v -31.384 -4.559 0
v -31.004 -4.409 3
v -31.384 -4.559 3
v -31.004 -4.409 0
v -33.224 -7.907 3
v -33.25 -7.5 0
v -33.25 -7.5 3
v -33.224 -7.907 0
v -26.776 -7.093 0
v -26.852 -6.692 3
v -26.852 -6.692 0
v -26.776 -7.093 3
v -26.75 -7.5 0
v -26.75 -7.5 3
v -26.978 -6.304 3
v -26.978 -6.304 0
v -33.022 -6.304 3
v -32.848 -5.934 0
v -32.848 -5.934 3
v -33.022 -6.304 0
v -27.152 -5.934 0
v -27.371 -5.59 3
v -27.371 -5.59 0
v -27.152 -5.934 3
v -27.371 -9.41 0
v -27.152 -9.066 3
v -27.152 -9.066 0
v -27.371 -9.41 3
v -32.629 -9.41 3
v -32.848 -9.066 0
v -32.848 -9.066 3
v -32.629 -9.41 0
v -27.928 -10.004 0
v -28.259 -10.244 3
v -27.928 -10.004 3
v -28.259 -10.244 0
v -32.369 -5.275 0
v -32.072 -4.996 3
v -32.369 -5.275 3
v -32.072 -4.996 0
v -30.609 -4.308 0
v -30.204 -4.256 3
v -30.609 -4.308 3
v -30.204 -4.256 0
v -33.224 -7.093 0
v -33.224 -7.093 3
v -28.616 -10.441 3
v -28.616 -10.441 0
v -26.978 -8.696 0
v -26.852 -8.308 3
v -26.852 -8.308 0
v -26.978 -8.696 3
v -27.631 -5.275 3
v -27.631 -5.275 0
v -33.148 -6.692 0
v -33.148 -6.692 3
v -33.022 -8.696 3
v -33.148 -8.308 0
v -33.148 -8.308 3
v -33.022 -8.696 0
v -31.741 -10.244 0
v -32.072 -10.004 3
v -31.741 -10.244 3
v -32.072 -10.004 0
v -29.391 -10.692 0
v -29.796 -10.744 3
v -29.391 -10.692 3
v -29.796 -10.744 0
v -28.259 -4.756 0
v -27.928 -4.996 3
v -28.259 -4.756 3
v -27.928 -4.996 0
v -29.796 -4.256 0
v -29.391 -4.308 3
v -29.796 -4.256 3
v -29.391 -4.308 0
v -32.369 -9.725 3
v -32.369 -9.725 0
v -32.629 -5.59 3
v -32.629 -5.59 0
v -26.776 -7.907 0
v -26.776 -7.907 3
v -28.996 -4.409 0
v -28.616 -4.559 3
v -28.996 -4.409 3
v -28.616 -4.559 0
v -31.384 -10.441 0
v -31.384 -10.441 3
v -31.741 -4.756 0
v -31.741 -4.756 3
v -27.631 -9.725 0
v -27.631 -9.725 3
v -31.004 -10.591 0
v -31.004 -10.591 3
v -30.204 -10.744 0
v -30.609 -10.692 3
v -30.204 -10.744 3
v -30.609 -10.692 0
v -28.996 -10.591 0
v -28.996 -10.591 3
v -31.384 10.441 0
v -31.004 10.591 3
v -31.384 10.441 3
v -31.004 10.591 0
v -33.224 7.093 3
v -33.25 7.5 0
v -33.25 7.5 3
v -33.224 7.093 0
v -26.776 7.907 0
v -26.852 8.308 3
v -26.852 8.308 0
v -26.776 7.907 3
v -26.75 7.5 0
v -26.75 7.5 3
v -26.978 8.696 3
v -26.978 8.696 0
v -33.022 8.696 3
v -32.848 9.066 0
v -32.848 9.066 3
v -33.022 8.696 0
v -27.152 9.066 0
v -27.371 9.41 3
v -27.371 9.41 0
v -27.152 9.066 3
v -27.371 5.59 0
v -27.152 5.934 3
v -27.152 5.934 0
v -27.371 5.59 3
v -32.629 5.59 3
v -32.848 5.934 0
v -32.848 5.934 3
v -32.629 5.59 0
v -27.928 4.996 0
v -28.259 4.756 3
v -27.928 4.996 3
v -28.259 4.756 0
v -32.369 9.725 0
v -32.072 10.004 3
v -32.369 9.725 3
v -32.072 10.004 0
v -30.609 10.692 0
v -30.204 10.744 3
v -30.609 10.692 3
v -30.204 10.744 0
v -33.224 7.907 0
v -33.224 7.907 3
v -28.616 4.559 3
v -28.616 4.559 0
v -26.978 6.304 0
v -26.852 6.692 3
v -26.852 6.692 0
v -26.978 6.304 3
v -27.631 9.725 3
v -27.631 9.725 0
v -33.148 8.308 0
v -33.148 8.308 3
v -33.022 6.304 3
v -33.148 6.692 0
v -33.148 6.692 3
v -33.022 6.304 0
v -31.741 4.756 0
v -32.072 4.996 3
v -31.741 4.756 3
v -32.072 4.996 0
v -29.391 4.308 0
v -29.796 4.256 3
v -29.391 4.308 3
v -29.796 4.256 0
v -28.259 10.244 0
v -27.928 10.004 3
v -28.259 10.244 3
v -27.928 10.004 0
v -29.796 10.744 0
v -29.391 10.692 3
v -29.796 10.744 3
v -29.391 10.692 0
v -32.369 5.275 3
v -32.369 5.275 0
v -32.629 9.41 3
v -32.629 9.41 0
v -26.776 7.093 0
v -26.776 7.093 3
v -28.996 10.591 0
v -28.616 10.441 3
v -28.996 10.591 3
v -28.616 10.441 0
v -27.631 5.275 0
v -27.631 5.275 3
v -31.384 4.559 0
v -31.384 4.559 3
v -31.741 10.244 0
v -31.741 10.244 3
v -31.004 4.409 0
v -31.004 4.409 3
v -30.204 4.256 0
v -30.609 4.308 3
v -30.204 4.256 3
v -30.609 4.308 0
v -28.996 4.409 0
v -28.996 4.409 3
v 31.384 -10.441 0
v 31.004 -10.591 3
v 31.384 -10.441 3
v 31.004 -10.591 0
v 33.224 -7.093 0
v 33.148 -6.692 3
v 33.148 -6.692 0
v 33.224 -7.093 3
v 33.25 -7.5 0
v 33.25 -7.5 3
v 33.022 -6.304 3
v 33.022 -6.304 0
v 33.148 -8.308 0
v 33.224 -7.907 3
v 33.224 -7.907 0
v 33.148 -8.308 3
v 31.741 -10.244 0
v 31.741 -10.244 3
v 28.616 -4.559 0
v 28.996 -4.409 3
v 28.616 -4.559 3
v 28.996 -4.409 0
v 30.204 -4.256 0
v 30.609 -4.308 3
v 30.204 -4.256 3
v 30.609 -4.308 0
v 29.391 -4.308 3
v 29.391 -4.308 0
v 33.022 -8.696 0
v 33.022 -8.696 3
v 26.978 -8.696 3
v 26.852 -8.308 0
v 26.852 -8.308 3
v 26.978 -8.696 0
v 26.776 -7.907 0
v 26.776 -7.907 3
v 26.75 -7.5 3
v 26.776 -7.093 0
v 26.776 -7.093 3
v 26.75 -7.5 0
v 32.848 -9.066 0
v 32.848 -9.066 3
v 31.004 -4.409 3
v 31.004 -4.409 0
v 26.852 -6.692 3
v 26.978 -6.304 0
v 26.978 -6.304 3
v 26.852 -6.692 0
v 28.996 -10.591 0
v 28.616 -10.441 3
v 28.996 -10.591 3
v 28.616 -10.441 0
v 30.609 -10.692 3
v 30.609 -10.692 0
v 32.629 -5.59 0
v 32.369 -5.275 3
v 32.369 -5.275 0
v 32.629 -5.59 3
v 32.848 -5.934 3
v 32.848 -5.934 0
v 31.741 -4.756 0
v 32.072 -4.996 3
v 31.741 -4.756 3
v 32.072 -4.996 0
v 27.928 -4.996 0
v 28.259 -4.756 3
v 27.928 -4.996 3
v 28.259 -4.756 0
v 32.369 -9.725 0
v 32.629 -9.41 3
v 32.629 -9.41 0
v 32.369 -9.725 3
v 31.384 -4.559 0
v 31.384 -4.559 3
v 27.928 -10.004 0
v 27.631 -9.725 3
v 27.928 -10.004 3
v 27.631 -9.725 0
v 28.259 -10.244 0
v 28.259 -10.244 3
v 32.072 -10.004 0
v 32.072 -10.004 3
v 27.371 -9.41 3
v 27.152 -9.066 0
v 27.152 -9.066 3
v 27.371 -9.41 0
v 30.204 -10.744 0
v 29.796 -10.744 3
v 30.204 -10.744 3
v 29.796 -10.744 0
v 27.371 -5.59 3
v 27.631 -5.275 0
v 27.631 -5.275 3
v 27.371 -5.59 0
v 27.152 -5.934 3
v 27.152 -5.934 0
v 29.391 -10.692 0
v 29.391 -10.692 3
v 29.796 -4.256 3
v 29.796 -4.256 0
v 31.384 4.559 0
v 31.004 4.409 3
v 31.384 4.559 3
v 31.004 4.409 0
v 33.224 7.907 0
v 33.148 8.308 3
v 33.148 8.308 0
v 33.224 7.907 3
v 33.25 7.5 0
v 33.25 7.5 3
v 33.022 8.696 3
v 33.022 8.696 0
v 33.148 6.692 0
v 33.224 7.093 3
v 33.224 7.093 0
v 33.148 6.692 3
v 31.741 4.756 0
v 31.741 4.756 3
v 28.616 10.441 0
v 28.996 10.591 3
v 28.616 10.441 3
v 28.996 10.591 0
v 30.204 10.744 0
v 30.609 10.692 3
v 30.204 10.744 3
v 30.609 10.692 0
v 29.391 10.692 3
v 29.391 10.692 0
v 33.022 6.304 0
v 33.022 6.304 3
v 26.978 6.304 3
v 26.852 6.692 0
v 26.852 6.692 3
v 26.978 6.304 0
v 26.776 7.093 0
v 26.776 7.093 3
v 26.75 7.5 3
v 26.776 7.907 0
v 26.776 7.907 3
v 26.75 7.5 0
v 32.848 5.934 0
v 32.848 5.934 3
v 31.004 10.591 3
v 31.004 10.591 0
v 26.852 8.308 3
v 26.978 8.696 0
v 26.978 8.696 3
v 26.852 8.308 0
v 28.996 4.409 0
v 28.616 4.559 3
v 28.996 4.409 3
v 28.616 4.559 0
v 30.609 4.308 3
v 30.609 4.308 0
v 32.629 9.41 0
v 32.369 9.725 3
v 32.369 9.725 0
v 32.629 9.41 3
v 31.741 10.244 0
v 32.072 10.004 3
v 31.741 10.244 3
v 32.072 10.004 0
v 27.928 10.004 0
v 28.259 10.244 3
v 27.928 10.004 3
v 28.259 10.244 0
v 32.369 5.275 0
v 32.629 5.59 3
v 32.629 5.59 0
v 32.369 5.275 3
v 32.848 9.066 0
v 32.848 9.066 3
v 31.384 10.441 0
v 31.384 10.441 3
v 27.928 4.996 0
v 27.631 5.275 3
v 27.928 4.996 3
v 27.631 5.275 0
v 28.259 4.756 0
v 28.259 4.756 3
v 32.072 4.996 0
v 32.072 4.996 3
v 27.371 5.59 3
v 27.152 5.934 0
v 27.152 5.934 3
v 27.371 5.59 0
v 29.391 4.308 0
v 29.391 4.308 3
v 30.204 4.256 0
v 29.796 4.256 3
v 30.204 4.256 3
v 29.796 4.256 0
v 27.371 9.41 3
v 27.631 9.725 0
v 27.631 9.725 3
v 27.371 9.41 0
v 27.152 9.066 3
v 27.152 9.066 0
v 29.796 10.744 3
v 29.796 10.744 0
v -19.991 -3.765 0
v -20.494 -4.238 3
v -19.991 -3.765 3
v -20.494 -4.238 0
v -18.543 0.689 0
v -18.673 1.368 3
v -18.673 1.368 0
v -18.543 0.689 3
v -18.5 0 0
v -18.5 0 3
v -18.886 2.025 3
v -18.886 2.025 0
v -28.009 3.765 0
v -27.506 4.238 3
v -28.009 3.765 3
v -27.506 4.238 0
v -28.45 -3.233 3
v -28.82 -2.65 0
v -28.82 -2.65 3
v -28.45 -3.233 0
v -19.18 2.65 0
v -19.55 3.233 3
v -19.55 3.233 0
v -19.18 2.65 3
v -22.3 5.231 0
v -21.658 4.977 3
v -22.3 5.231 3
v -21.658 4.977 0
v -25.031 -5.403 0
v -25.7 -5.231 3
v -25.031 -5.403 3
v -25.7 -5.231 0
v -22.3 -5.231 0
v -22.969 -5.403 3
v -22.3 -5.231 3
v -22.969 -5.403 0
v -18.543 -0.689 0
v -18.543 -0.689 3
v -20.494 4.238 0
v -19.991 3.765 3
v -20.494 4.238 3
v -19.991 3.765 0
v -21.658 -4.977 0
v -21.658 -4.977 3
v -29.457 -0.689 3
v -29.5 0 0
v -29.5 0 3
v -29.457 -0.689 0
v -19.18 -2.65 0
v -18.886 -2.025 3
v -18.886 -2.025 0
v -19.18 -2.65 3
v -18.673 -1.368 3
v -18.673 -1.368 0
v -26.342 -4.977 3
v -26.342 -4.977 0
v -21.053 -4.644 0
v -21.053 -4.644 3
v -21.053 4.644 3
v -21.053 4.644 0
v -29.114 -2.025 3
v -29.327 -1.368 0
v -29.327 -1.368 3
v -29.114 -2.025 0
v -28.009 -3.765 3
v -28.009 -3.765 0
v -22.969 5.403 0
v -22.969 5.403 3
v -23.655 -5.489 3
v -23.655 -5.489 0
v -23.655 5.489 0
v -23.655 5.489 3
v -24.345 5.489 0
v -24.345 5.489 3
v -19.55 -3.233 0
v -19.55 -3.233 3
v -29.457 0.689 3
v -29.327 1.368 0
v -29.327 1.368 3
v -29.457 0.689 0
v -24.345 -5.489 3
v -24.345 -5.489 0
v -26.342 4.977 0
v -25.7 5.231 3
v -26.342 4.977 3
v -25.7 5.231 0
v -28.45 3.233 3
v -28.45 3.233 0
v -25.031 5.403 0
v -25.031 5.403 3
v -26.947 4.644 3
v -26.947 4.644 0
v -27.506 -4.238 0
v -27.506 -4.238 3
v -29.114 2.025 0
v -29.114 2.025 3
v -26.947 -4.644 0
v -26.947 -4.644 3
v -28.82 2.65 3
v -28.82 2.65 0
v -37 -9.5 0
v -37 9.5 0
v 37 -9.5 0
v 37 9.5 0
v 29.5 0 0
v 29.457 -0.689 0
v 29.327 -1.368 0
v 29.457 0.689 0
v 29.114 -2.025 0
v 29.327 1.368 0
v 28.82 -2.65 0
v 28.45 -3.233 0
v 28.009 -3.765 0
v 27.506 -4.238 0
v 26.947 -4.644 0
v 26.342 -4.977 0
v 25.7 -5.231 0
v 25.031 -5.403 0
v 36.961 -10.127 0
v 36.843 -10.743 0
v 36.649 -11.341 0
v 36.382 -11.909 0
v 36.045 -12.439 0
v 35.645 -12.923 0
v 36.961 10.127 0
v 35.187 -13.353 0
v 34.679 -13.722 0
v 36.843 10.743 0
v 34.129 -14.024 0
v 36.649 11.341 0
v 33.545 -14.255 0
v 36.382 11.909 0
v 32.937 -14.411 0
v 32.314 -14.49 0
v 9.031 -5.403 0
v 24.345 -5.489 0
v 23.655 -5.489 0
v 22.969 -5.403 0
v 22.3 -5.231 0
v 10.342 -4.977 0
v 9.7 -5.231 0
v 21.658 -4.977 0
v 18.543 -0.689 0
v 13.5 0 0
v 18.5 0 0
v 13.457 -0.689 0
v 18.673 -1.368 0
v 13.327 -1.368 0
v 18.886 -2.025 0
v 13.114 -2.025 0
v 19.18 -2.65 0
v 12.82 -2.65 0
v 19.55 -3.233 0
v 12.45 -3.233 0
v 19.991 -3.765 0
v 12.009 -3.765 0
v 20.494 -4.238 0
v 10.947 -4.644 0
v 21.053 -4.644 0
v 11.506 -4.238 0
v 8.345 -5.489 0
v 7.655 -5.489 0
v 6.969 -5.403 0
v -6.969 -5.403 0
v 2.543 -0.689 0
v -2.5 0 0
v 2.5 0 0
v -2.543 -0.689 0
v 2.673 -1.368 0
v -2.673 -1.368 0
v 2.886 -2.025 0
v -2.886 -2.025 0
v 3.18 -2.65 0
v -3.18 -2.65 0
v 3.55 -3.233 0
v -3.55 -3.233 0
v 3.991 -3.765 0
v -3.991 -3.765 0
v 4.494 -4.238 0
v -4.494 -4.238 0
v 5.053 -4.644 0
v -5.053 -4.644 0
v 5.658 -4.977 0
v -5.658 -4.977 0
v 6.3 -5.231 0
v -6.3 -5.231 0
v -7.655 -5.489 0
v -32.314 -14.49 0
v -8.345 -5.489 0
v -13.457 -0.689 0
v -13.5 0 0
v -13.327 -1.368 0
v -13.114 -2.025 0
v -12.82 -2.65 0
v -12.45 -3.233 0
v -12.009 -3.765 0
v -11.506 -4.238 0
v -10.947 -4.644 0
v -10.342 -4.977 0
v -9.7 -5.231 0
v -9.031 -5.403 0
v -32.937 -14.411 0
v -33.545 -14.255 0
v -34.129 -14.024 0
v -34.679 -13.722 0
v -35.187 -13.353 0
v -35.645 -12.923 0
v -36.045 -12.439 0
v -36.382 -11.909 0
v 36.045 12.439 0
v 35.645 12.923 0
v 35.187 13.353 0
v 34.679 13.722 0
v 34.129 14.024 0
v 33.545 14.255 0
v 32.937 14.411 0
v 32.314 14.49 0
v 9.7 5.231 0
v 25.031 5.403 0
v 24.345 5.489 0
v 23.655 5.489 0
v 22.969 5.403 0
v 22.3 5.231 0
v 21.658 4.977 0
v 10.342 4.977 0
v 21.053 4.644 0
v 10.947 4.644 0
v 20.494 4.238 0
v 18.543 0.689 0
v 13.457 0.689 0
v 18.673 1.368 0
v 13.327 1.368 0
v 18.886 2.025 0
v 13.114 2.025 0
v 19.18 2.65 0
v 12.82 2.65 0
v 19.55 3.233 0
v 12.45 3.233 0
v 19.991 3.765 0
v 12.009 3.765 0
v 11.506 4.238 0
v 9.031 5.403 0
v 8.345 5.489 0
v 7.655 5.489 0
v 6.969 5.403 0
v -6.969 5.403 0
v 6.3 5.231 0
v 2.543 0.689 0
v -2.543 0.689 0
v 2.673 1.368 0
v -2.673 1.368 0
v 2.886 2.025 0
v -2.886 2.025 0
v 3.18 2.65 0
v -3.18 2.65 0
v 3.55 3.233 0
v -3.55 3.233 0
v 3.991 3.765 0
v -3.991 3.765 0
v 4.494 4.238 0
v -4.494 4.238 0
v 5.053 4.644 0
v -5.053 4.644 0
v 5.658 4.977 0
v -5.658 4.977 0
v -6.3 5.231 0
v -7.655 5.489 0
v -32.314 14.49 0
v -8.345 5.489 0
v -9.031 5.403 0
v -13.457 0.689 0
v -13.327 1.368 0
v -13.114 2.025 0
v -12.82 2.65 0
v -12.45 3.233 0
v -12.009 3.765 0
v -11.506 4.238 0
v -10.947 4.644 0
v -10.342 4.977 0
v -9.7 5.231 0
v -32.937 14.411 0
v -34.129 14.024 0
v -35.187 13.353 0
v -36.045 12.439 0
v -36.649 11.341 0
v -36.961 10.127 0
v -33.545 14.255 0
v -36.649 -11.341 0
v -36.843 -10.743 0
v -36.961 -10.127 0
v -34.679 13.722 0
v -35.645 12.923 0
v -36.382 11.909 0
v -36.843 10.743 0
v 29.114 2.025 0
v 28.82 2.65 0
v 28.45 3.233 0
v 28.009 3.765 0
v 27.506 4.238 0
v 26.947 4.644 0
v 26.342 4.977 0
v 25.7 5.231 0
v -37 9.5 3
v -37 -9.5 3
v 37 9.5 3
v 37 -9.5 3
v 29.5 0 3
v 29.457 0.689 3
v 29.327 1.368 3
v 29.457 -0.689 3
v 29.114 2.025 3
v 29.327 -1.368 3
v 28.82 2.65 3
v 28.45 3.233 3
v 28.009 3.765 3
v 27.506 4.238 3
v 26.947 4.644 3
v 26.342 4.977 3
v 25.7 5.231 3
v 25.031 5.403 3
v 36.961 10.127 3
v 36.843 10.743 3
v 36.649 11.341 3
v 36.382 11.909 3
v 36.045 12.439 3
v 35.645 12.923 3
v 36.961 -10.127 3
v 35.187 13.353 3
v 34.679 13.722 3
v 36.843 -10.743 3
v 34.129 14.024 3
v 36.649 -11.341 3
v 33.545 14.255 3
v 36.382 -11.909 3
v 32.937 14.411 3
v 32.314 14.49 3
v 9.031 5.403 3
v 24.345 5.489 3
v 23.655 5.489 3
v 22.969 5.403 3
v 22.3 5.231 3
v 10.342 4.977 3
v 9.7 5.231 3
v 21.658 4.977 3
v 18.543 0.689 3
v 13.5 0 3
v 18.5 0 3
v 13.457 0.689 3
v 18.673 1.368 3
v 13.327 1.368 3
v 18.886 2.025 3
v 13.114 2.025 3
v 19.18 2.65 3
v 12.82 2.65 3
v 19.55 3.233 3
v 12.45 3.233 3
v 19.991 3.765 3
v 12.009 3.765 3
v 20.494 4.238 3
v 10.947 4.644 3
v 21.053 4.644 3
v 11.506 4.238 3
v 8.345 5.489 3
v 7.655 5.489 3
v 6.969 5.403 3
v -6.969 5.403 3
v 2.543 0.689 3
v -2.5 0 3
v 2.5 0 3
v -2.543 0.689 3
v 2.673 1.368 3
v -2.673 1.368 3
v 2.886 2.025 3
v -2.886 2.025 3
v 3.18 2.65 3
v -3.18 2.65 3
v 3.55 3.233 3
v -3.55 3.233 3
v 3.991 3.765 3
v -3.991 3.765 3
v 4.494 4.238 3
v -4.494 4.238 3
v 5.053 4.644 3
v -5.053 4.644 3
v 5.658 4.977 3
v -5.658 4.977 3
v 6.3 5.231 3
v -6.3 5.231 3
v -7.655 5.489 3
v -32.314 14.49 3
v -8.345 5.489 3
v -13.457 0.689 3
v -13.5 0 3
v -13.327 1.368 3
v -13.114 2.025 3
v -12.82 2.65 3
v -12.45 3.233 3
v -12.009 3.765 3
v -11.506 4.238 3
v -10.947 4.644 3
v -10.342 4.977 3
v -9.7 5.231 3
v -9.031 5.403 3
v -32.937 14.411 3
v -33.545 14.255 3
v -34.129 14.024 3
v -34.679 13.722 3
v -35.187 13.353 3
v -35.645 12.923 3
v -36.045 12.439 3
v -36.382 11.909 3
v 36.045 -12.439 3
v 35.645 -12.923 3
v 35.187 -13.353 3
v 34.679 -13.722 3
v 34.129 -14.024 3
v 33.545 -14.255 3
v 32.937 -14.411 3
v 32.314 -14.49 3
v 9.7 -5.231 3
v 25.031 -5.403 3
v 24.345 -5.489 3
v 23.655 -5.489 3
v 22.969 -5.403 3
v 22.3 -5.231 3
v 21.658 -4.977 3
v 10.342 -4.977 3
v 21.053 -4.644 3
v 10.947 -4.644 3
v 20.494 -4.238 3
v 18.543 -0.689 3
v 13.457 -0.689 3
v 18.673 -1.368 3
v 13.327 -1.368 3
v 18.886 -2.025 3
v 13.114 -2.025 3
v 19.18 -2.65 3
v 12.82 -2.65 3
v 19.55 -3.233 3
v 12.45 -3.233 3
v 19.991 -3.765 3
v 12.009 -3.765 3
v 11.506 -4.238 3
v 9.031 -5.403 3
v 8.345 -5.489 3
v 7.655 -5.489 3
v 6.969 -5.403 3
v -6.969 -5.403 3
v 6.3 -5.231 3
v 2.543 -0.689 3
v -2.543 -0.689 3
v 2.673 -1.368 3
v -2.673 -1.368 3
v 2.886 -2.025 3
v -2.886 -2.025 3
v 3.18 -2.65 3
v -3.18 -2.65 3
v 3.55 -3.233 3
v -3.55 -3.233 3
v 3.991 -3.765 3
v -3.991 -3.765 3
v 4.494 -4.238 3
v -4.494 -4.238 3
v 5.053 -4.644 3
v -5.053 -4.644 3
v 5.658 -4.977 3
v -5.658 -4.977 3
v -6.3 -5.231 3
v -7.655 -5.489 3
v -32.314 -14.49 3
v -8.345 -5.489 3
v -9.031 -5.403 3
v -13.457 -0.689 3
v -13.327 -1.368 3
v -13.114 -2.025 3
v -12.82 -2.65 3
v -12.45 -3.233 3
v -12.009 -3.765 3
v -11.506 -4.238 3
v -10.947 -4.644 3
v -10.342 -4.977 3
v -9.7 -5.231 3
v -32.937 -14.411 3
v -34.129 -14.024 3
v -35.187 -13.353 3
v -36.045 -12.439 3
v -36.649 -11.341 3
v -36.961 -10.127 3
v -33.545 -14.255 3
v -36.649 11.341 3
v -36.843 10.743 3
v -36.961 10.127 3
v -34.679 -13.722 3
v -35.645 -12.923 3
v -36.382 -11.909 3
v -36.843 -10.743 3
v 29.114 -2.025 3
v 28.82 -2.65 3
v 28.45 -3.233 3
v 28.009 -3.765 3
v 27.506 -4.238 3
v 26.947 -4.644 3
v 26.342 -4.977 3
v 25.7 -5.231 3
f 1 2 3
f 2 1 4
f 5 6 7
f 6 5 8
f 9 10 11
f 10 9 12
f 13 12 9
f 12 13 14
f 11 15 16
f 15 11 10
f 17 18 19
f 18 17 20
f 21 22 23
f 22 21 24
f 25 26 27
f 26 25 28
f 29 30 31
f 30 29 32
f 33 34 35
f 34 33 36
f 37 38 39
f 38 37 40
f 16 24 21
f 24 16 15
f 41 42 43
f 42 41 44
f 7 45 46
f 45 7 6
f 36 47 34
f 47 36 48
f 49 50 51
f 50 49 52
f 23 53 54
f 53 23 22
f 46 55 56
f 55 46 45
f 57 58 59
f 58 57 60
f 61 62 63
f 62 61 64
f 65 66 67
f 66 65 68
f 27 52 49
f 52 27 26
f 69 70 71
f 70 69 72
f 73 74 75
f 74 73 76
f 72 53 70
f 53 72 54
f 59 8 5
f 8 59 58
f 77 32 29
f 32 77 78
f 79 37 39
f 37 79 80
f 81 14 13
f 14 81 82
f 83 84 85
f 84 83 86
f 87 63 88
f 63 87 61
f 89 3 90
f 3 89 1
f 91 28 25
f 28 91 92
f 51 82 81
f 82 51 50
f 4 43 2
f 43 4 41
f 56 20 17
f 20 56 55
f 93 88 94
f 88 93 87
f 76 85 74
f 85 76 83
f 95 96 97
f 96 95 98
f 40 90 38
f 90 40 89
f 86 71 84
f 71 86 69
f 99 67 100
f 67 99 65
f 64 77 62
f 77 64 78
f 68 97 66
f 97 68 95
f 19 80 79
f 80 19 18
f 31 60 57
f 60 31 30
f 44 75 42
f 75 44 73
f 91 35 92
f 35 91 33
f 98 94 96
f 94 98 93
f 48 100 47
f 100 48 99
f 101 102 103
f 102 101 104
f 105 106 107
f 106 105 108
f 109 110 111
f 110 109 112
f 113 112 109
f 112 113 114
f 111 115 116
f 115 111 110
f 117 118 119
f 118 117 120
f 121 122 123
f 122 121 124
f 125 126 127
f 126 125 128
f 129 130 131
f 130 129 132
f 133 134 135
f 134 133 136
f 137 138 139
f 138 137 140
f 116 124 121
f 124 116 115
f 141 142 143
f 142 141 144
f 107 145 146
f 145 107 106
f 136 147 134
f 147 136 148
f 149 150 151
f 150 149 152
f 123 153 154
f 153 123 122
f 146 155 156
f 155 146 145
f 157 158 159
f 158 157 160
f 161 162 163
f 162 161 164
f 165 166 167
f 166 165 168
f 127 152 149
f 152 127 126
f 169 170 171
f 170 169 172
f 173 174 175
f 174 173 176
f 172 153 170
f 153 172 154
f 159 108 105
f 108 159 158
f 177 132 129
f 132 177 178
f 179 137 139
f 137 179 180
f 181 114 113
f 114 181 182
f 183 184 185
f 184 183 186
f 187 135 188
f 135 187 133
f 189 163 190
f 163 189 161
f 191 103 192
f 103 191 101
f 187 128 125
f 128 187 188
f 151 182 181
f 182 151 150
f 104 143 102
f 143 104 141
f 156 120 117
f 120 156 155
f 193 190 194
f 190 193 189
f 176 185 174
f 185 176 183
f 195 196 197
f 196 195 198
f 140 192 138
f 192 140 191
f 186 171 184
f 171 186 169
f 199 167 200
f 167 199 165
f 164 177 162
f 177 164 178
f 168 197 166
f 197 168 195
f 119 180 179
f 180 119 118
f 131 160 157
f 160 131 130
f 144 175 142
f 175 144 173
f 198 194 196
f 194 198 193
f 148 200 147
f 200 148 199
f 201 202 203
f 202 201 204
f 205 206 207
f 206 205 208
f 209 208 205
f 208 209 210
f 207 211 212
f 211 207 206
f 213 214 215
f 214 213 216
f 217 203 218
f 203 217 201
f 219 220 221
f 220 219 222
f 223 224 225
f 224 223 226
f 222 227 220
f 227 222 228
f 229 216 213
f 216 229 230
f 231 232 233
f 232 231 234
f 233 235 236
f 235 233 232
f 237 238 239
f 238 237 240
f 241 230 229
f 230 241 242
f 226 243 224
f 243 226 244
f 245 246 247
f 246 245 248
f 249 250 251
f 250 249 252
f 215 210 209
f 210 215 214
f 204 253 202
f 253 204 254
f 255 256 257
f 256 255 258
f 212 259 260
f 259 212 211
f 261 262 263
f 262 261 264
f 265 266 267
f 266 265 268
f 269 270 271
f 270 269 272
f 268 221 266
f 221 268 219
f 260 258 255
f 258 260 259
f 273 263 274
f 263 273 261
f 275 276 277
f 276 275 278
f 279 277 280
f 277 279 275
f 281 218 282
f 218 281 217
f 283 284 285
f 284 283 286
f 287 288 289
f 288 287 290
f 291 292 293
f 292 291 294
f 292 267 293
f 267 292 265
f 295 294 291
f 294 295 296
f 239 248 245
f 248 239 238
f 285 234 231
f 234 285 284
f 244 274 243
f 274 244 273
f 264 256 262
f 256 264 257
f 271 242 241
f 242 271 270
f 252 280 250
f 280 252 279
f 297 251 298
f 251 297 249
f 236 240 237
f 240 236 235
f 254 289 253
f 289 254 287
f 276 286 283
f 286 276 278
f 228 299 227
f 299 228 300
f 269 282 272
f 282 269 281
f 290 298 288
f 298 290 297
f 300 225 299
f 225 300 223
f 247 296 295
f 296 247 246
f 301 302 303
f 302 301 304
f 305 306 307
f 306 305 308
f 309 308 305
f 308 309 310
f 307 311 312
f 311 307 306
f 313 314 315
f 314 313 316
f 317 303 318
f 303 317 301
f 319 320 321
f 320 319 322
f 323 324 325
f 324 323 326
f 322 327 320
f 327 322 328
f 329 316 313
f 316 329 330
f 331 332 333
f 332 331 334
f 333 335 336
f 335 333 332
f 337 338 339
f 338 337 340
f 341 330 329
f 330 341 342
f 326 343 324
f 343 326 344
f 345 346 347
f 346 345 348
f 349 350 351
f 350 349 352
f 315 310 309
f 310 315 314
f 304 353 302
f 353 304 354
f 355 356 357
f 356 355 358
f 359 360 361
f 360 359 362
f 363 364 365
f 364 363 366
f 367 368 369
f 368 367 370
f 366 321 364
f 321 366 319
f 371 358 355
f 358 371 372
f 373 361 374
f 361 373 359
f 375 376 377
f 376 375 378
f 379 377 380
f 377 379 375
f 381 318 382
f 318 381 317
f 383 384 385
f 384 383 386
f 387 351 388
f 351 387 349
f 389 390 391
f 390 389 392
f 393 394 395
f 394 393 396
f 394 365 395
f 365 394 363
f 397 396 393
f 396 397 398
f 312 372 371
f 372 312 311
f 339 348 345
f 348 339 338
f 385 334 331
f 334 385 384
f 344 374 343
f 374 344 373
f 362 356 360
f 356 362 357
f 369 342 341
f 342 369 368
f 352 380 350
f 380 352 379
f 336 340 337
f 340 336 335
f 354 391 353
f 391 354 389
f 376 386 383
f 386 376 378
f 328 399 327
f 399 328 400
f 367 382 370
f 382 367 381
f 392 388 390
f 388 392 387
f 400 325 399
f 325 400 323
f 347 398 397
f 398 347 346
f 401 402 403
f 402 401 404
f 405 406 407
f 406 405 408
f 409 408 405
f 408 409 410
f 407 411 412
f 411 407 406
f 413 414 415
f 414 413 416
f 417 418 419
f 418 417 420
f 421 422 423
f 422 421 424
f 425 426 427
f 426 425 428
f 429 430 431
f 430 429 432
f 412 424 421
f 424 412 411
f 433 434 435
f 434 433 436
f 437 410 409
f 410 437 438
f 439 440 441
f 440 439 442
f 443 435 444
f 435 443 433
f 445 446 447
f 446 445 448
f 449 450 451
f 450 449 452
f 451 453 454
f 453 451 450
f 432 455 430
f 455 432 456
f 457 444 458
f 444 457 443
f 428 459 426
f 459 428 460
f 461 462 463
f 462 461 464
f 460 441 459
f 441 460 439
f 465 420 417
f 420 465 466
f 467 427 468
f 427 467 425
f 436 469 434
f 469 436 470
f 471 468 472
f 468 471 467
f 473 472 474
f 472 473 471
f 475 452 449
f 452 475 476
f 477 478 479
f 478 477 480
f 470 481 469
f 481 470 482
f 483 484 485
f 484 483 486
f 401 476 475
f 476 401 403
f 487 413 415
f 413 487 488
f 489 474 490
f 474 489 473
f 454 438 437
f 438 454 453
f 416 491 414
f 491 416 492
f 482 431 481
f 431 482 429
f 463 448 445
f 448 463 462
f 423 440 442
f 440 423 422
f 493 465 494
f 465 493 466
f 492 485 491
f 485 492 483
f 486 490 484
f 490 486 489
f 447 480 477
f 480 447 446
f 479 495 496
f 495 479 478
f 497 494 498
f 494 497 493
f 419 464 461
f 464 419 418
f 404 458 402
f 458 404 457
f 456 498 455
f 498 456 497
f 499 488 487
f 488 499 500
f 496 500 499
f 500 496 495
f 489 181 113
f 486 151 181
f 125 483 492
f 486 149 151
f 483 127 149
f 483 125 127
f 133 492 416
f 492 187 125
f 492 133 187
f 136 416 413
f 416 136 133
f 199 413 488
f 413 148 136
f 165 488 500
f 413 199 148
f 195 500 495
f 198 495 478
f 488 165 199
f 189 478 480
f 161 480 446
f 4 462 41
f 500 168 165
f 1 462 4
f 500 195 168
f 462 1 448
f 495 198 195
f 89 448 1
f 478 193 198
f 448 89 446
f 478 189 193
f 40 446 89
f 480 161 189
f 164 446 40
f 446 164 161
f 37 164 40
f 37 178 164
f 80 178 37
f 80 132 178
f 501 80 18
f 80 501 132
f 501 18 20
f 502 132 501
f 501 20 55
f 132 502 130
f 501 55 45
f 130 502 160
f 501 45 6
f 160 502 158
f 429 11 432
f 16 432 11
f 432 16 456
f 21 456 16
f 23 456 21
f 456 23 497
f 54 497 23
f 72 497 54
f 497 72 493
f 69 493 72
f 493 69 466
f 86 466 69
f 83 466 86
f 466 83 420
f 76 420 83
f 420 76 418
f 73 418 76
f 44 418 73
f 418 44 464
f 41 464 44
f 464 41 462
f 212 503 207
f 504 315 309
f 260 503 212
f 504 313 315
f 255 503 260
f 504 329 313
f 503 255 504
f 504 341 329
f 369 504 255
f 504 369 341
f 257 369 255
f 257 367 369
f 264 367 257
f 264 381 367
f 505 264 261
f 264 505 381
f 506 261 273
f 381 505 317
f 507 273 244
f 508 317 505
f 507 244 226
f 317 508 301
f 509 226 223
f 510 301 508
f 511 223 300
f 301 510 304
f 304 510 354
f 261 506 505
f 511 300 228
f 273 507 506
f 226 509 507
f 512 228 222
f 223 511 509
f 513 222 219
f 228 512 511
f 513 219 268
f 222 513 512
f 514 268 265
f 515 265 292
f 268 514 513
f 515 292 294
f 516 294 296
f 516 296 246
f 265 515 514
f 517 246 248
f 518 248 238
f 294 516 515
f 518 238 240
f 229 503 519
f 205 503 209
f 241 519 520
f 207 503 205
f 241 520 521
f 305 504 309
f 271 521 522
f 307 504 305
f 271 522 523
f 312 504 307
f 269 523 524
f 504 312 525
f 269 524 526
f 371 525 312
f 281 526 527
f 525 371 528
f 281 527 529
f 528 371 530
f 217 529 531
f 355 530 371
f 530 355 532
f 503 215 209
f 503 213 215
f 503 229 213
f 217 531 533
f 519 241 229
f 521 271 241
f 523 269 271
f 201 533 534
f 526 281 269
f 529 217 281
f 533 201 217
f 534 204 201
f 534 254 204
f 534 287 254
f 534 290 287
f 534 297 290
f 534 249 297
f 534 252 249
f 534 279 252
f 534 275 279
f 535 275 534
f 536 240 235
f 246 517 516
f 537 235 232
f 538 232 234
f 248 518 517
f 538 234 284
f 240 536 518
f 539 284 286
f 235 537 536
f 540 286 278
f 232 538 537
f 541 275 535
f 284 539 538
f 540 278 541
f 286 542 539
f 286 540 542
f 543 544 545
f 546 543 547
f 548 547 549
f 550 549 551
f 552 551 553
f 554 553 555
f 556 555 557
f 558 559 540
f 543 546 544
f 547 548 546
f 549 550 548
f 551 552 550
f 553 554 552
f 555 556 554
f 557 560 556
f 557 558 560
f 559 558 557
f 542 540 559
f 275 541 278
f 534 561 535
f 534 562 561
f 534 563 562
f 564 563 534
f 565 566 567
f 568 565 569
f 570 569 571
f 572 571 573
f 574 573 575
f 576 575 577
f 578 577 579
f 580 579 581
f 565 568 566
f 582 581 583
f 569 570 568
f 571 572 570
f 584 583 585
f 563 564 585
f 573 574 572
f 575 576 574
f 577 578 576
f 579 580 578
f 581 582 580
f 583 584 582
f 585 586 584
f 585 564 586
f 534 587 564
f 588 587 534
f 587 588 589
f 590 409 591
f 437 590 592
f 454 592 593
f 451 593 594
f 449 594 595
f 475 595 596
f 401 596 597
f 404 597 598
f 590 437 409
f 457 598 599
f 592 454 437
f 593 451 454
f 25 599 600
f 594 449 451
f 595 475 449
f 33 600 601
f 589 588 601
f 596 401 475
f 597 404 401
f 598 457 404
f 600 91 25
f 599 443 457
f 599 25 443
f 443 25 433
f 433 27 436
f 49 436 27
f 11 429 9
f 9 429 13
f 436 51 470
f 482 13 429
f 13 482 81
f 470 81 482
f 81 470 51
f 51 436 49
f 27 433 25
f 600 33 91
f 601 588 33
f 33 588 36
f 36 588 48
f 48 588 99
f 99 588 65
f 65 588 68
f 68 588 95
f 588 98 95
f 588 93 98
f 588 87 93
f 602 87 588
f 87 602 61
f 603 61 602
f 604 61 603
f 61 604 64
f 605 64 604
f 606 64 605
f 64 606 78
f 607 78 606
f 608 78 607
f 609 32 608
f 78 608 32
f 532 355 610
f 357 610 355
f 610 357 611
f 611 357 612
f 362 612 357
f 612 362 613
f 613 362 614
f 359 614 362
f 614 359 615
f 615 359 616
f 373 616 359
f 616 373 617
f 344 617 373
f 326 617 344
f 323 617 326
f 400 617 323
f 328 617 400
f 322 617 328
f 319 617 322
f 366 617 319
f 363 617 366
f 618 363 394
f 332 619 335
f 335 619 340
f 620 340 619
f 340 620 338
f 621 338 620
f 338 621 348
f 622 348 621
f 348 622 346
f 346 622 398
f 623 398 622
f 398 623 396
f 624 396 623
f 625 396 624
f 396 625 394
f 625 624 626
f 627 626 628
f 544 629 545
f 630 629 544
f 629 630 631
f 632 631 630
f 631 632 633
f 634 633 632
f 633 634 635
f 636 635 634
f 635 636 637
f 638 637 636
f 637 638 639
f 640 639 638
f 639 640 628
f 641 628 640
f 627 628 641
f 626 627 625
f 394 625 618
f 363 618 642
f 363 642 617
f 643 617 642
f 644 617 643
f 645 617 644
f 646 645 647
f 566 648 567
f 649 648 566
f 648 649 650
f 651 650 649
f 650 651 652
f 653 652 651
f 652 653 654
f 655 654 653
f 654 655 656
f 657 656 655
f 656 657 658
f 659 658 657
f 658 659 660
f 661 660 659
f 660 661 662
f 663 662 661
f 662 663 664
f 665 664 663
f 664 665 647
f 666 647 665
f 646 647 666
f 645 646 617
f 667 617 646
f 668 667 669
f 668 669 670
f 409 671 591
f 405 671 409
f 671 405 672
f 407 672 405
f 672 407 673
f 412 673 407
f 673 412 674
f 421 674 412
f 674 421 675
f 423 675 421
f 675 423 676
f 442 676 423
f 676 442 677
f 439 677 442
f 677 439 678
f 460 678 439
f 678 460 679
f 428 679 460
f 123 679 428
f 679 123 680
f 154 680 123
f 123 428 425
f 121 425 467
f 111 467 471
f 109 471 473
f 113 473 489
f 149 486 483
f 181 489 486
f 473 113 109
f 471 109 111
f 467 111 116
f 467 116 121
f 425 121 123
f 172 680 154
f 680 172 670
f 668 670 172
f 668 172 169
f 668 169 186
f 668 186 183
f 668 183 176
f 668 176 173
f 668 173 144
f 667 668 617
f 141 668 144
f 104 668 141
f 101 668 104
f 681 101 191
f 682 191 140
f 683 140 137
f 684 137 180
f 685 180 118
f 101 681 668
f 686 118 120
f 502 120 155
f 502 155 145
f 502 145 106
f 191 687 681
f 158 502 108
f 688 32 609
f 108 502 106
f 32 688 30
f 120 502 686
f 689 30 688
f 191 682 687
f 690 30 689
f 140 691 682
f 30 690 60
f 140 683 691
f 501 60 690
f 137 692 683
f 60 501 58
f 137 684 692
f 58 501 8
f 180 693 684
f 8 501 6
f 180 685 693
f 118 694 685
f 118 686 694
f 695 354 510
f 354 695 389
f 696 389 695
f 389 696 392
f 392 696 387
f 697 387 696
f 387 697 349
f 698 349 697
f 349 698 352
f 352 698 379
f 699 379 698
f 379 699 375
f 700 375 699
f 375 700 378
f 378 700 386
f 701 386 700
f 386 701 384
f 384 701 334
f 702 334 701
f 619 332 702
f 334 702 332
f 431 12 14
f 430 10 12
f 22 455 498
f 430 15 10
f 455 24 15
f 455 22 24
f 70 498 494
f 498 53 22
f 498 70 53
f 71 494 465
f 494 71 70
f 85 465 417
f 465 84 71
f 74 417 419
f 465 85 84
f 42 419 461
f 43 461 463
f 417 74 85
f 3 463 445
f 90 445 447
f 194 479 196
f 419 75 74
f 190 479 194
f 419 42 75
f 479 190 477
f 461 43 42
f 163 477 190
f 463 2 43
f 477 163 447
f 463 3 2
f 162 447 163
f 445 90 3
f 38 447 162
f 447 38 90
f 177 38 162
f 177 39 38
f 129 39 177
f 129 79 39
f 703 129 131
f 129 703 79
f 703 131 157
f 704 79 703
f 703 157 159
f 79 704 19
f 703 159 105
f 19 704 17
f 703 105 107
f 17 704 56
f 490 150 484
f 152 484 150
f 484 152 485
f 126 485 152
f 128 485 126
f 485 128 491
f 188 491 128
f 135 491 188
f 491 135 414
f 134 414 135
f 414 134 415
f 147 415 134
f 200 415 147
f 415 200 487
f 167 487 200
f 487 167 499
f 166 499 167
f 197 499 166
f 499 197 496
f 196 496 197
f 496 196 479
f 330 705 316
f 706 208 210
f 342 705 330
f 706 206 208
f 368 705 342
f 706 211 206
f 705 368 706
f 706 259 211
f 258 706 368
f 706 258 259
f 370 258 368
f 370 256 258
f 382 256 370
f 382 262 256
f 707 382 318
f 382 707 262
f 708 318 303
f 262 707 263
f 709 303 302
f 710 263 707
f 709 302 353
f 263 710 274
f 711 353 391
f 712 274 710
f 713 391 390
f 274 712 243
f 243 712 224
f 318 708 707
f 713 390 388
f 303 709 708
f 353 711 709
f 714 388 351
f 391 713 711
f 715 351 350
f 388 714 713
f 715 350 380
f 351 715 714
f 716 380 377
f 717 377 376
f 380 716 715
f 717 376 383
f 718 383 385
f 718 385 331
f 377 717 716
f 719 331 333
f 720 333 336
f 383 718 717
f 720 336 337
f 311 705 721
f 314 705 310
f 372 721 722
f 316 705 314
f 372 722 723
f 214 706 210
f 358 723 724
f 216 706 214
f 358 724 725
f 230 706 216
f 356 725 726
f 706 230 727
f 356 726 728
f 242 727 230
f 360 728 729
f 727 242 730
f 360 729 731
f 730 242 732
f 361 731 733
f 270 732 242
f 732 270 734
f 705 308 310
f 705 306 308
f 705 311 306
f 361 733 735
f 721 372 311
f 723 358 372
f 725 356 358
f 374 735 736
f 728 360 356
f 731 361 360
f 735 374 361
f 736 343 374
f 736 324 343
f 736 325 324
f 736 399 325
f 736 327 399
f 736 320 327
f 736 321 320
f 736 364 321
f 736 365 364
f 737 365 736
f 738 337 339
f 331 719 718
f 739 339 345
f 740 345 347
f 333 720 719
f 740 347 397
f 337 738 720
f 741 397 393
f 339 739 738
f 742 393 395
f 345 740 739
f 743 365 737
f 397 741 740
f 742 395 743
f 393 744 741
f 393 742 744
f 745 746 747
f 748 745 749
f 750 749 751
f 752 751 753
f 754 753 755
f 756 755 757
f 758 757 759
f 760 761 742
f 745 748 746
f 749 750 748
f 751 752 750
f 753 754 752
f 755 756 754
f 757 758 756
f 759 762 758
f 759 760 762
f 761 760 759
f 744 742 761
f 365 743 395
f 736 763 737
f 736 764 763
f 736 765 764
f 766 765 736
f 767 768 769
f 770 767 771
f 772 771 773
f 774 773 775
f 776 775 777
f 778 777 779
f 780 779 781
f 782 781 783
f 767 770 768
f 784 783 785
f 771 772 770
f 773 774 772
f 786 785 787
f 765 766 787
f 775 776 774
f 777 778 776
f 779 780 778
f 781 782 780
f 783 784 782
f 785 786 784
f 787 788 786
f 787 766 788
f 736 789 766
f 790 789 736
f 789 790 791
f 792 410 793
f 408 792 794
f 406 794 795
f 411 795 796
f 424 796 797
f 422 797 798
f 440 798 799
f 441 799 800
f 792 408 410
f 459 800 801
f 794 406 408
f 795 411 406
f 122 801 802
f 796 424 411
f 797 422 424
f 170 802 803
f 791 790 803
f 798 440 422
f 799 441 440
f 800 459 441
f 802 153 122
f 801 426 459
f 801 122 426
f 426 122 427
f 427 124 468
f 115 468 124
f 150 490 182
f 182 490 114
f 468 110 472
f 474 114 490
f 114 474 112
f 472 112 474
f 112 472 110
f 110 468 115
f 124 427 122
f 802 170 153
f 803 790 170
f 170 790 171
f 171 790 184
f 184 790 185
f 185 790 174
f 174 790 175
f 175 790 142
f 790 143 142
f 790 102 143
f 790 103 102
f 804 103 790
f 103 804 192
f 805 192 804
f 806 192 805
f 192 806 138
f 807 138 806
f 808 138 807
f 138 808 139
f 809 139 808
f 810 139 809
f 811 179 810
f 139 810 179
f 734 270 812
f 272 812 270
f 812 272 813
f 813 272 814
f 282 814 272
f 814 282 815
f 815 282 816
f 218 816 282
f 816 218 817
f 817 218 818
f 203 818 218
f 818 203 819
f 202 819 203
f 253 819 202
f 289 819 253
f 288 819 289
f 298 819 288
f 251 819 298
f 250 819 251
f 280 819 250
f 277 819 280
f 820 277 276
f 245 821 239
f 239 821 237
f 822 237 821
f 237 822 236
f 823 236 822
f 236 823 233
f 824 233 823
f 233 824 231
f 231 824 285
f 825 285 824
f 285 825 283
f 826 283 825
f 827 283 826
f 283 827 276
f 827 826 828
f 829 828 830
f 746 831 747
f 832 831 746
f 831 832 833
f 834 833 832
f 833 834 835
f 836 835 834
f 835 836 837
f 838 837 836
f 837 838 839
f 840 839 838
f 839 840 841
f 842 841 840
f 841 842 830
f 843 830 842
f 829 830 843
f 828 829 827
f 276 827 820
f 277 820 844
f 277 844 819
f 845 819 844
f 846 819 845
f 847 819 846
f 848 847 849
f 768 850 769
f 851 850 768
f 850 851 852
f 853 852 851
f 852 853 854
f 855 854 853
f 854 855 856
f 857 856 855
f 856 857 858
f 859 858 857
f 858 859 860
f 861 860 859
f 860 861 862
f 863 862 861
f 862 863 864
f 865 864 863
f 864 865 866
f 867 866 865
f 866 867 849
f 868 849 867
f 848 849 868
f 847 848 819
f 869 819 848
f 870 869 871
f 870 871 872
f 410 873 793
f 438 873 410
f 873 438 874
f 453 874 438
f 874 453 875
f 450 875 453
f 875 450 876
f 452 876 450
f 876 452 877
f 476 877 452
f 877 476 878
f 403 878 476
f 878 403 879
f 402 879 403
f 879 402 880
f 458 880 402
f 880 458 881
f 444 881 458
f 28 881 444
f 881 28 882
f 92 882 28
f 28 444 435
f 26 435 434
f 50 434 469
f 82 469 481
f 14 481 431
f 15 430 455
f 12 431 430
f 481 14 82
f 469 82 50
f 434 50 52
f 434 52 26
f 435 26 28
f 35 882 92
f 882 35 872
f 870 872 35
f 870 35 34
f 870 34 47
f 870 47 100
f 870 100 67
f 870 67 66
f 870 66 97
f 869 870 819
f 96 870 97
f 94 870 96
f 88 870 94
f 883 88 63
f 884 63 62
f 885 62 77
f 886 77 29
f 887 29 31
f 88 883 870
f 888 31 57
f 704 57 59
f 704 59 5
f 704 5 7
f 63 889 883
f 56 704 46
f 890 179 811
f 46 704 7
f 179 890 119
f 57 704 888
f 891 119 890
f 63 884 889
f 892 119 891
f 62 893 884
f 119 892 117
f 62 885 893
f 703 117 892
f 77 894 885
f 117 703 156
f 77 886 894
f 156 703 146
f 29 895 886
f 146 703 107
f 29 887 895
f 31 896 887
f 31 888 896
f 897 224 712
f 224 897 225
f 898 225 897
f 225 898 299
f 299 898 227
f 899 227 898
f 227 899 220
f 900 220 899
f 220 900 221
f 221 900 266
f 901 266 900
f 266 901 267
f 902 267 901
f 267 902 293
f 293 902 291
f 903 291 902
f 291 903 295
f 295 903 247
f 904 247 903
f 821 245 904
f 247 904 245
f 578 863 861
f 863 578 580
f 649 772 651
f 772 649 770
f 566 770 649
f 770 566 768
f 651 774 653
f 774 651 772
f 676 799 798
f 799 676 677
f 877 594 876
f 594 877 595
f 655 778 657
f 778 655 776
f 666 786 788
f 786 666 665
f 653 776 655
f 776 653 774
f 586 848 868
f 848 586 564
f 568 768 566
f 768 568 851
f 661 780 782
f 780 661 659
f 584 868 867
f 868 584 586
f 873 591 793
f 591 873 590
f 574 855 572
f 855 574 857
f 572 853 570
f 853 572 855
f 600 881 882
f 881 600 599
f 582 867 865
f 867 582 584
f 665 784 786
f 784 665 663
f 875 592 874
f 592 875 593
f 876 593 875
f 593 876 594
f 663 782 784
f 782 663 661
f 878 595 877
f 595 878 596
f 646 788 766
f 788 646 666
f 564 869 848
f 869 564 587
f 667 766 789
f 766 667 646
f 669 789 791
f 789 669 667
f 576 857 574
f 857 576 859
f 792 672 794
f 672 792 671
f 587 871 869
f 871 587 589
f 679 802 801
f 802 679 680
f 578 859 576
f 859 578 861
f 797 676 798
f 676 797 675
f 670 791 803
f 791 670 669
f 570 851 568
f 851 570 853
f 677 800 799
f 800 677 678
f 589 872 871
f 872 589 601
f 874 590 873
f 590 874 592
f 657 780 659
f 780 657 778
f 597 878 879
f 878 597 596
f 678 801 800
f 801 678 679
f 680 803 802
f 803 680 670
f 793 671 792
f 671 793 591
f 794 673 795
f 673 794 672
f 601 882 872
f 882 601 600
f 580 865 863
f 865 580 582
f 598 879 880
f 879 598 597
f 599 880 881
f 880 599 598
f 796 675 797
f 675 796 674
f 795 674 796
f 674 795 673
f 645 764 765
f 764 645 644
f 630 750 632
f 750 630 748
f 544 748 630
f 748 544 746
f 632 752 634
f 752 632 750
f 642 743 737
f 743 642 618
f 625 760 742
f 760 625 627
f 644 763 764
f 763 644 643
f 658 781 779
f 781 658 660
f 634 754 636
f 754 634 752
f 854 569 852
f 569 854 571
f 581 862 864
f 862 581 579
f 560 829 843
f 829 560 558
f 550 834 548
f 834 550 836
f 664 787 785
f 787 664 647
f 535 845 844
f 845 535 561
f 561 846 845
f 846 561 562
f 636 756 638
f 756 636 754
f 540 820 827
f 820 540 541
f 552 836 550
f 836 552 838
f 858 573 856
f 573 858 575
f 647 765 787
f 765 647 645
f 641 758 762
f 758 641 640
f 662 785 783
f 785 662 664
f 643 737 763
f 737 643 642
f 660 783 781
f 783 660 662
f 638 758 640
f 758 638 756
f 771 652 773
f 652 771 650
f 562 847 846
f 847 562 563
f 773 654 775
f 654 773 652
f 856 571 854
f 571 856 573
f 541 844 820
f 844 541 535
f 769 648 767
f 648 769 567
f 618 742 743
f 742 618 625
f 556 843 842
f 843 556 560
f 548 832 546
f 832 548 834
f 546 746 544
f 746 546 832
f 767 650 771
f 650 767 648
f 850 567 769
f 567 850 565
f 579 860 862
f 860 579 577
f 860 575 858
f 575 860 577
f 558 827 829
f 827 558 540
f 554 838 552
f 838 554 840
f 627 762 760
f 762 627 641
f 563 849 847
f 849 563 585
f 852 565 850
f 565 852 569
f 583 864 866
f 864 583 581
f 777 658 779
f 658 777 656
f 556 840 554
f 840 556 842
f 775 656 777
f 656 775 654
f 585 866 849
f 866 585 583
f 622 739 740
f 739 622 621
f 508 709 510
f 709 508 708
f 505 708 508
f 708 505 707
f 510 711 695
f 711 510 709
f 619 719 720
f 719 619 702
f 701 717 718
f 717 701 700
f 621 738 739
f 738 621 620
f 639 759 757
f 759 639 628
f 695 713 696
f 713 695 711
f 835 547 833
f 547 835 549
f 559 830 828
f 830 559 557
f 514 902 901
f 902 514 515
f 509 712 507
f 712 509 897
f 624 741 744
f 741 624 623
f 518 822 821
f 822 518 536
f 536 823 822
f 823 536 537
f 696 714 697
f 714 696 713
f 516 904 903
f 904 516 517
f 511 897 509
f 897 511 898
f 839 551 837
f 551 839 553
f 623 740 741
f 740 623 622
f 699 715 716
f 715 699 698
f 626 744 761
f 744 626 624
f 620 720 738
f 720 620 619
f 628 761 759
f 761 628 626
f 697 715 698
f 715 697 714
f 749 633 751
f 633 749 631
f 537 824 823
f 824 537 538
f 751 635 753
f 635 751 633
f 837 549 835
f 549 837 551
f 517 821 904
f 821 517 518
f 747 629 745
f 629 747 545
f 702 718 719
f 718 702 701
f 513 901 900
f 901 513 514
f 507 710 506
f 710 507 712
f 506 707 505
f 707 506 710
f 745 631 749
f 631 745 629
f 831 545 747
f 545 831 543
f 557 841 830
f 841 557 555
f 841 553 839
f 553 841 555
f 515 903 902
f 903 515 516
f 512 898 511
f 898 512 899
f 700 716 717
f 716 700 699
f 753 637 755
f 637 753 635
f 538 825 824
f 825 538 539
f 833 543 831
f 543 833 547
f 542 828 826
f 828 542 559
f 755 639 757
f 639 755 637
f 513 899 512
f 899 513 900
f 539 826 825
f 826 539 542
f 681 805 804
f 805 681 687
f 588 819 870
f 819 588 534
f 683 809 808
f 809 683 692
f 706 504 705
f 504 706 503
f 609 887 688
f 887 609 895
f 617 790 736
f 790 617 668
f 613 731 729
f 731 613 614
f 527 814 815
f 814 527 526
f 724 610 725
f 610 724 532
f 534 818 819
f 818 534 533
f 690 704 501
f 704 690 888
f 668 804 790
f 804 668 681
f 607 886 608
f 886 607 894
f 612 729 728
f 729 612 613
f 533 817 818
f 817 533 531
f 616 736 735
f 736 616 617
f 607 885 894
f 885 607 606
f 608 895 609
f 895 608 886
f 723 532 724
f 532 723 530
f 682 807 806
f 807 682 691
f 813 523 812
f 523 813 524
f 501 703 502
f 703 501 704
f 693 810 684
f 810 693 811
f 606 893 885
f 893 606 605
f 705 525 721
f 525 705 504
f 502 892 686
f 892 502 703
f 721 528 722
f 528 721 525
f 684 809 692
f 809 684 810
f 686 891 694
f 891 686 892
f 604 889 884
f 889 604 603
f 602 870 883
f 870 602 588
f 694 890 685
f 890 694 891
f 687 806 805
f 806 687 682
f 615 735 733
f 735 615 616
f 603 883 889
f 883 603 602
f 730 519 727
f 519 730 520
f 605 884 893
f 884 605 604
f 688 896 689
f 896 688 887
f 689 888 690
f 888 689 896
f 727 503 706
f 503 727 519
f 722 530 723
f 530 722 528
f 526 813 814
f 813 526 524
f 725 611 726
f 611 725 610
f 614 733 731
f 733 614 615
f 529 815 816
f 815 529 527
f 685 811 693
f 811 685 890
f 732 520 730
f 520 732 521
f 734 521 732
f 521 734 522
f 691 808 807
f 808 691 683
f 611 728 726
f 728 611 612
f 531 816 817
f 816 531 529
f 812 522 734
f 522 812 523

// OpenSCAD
$fn = 50;

difference() {
	union() {
		hull() {
			translate(v = [-32.0, 9.5, 0]) {
				cylinder(h = 3, r = 5);
			}
			translate(v = [32.0, 9.5, 0]) {
				cylinder(h = 3, r = 5);
			}
			translate(v = [-32.0, -9.5, 0]) {
				cylinder(h = 3, r = 5);
			}
			translate(v = [32.0, -9.5, 0]) {
				cylinder(h = 3, r = 5);
			}
		}
	}
	union() {
		translate(v = [-30.0, -7.5, -100.0]) {
			cylinder(h = 200, r = 3.25);
		}
		translate(v = [-30.0, 7.5, -100.0]) {
			cylinder(h = 200, r = 3.25);
		}
		translate(v = [30.0, -7.5, -100.0]) {
			cylinder(h = 200, r = 3.25);
		}
		translate(v = [30.0, 7.5, -100.0]) {
			cylinder(h = 200, r = 3.25);
		}
		translate(v = [-30.0, -7.5, -100.0]) {
			cylinder(h = 200, r = 1.8);
		}
		translate(v = [-30.0, 7.5, -100.0]) {
			cylinder(h = 200, r = 1.8);
		}
		translate(v = [30.0, -7.5, -100.0]) {
			cylinder(h = 200, r = 1.8);
		}
		translate(v = [30.0, 7.5, -100.0]) {
			cylinder(h = 200, r = 1.8);
		}
		translate(v = [-24.0, 0, 0.0]) {
			cylinder(h = 3, r = 5.5);
		}
		translate(v = [-8.0, 0, 0.0]) {
			cylinder(h = 3, r = 5.5);
		}
		translate(v = [8.0, 0, 0.0]) {
			cylinder(h = 3, r = 5.5);
		}
		translate(v = [24.0, 0, 0.0]) {
			cylinder(h = 3, r = 5.5);
		}
	}
}
